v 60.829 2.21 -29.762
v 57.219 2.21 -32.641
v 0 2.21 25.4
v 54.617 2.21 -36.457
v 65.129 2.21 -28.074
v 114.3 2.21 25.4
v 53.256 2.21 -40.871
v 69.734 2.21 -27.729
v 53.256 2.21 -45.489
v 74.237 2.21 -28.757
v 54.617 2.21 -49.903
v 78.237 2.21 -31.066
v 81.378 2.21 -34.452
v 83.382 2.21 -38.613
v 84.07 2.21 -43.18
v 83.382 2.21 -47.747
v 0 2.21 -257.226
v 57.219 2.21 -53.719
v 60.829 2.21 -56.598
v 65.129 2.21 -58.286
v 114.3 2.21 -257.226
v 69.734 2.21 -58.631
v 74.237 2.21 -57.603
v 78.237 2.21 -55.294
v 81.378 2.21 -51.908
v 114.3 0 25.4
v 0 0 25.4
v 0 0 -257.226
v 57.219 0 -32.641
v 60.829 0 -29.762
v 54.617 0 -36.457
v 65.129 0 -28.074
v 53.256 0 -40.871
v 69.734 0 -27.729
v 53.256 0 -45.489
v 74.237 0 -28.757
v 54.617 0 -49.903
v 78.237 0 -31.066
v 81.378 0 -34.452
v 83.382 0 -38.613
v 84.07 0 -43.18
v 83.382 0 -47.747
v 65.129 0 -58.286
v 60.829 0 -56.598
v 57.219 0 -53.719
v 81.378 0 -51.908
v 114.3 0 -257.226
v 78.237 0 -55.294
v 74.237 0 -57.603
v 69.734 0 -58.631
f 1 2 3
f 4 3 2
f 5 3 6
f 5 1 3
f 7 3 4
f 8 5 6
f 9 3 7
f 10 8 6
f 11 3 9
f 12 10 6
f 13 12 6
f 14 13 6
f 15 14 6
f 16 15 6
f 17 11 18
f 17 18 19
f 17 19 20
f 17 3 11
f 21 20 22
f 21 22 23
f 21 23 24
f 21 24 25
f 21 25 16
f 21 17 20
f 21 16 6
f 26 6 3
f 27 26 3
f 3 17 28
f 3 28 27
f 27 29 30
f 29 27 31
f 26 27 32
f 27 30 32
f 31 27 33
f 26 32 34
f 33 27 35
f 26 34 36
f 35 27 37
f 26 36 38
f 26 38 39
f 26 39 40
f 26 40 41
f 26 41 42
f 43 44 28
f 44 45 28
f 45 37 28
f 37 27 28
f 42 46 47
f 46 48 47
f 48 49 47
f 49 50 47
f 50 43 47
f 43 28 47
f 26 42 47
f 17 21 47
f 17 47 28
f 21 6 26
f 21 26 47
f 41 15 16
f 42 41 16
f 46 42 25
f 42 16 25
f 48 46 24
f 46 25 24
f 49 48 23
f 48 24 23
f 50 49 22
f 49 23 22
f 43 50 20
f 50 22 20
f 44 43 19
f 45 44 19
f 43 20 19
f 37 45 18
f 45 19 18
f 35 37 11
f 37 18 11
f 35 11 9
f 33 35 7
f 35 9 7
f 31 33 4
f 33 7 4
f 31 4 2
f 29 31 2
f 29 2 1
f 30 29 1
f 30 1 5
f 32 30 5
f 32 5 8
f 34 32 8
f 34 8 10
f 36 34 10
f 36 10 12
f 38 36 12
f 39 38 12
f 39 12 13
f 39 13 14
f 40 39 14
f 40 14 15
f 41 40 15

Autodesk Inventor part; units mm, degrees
ref_plane "YZ Plane" through (0, 0, 0) normal (1, 0, 0) x (0, 1, 0)
ref_plane "XZ Plane" through (0, 0, 0) normal (0, 1, 0) x (-1, 0, 0)
ref_plane "XY Plane" through (0, 0, 0) normal (0, 0, 1) x (1, 0, 0)
sketch "Sketch1" plane through (0, 0, 0) normal (0, 1, 0) x (-1, 0, 0)
  line L0 (0, 0) -> (-149.225, 0)
  line L1 (-149.225, 0) -> (-149.225, -149.225)
  line L2 (-149.225, -149.225) -> (0, -149.225)
  line L3 (0, -149.225) -> (0, 0)
  circle A0 centre (-74.6125, -74.6125) radius 14.351
  dimension "d0" = 149.225
  dimension "d1" = 149.225
  dimension "d2" = 28.702
extrude "Extrusion1" add sketch "Sketch1" along normal blind 2.2098
sketch "Sketch5" plane through (0, 2.2098, 0) normal (0, 1, 0) x (1, 0, 0)
  circle A0 centre (74.6125, 74.6125) radius 14.351 projected
  line L0 (0, 0) -> (149.225, 0) projected
  line L1 (149.225, 0) -> (149.225, 149.225) projected
  line L2 (149.225, 149.225) -> (0, 149.225) projected
  line L3 (0, 149.225) -> (0, 0) projected
  line L4 (0, 0) -> (114.3, 0)
  line L5 (114.3, 0) -> (114.3, 257.2258)
  line L6 (114.3, 257.2258) -> (0, 257.2258)
  line L7 (0, 257.2258) -> (0, 0)
  dimension "d21" = 114.3
  dimension "d22" = 257.2258
extrude "Extrusion6" add sketch "Sketch5" against normal blind 2.2098 contours L3 L2 L5 L0 | L7 L6 L5 L2
sketch "Sketch6" plane through (0, 2.2098, 0) normal (0, 1, 0) x (1, 0, 0)
  line L0 (114.3, 149.225) -> (149.225, 149.225)
  line L1 (149.225, 149.225) -> (149.225, 0)
  line L2 (149.225, 0) -> (114.3, 0)
  line L3 (114.3, 0) -> (114.3, 149.225)
  point P0 (0, 0)
extrude "Extrusion7" cut sketch "Sketch6" against normal blind 2.2098
sketch "Sketch7" plane through (0, 2.2098, 0) normal (0, 1, 0) x (1, 0, 0)
  circle A0 centre (74.6125, 74.6125) radius 14.351 projected
  circle A1 centre (74.6125, 74.6125) radius 14.351
  point P0 (0, 0)
extrude "Extrusion8" add sketch "Sketch7" against normal blind 2.2098
sketch "Sketch8" plane through (0, 2.2098, 0) normal (0, 1, 0) x (1, 0, 0)
  line L0 (0, 0) -> (114.3, 0) projected
  line L1 (16.637, 0) -> (97.663, 0)
  line L2 (16.637, 30.422) -> (16.637, 0)
  line L3 (16.637, 40.513) -> (57.15, 40.513)
  line L4 (57.15, 40.513) -> (57.15, 0)
  line L5 (57.15, 0) -> (16.637, 0)
  line L6 (16.637, 0) -> (16.637, 40.513)
  circle A0 centre (57.15, 40.513) radius 15.494
  dimension "d31" = 30.988
extrude "Extrusion9" cut sketch "Sketch8" against normal blind 2.2098 contours A0 L3 L4 | L4 L3 A0
sketch "Sketch9" plane through (0, 2.2098, 0) normal (0, 1, 0) x (1, 0, 0)
  circle A0 centre (57.15, 40.513) radius 15.494 projected
  line L0 (114.3, 0) -> (114.3, 257.2258) projected
  line L1 (114.3, 257.2258) -> (0, 257.2258) projected
  line L2 (0, 257.2258) -> (0, 0) projected
  line L3 (0, 0) -> (114.3, 0) projected
  line L4 (0, 0) -> (114.3, 0)
  line L5 (114.3, 0) -> (114.3, -25.4)
  line L6 (114.3, -25.4) -> (0, -25.4)
  line L7 (0, -25.4) -> (0, 0)
  line L8 (114.3, 257.2258) -> (114.3, 0) projected
  line L9 (0, 257.2258) -> (114.3, 257.2258)
  line L10 (114.3, 257.2258) -> (114.3, 231.8258)
  line L11 (114.3, 231.8258) -> (0, 231.8258)
  line L12 (0, 231.8258) -> (0, 257.2258)
  dimension "d34" = 25.4
  dimension "d35" = 25.4
extrude "Extrusion10" cut sketch "Sketch9" against normal blind 2.2098 contours L11 L2 L1 L0
extrude "Extrusion11" add sketch "Sketch9" against normal blind 2.2098 contours L5 L6 L7 L3
sketch "Sketch10" plane through (0, 2.2098, 0) normal (0, 1, 0) x (1, 0, 0)
  line L0 (0, -25.4) -> (25.4, -25.4)
  line L1 (25.4, -25.4) -> (25.4, 86.8868)
  line L2 (25.4, 86.8868) -> (0, 86.8868)
  line L3 (0, 86.8868) -> (0, -25.4)
  line L4 (114.3, -25.4) -> (114.3, 231.8258) projected
  line L5 (0, -25.4) -> (114.3, -25.4)
  line L6 (114.3, -25.4) -> (114.3, 0)
  line L7 (114.3, 0) -> (0, 0)
  line L8 (0, 0) -> (0, -25.4)
  line L9 (114.3, 231.8258) -> (0, 231.8258) projected
  line L10 (0, 231.8258) -> (0, -25.4) projected
  line L11 (0, -25.4) -> (114.3, -25.4) projected
  line L12 (114.3, -25.4) -> (114.3, 231.8258) projected
  circle A0 centre (57.15, 40.513) radius 15.494 projected
  circle A1 centre (57.15, 40.513) radius 15.494
  dimension "d40" = 25.4
extrude "Extrusion12" add sketch "Sketch10" against normal blind 2.2098 contours A0
sketch "Sketch11" plane through (0, 2.2098, 0) normal (0, 1, 0) x (1, 0, 0)
  line L0 (25.3965, 0) -> (68.5765, 0)
  line L1 (68.5765, 0) -> (68.5765, 43.18)
  line L2 (68.5765, 43.18) -> (25.3965, 43.18)
  line L3 (25.3965, 43.18) -> (25.3965, 0)
  circle A0 centre (68.5765, 43.18) radius 15.494
  point P0 (0, 0)
  dimension "d43" = 43.18
  dimension "d44" = 43.18
  dimension "d45" = 30.988
extrude "Extrusion13" cut sketch "Sketch11" against normal blind 2.2098 contours A0 L2 L1 | L1 L2 A0
sketch "Sketch12" plane through (0, 2.2098, 0) normal (0, 1, 0) x (1, 0, 0)
  circle A0 centre (68.5765, 43.18) radius 15.494 projected
  line L0 (114.3, 231.8258) -> (0, 231.8258) projected
  line L1 (0, 231.8258) -> (0, -25.4) projected
  line L2 (0, -25.4) -> (114.3, -25.4) projected
  line L3 (114.3, -25.4) -> (114.3, 231.8258) projected
  line L4 (0, 231.8258) -> (114.3, 231.8258)
  line L5 (114.3, 231.8258) -> (114.3, 257.2258)
  line L6 (114.3, 257.2258) -> (0, 257.2258)
  line L7 (0, 257.2258) -> (0, 231.8258)
  point P0 (0, 0)
  dimension "d48" = 25.4
extrude "Extrusion14" add sketch "Sketch12" against normal blind 2.2098 contours L0 L7 L6 L5
properties part number "bearing plate"
